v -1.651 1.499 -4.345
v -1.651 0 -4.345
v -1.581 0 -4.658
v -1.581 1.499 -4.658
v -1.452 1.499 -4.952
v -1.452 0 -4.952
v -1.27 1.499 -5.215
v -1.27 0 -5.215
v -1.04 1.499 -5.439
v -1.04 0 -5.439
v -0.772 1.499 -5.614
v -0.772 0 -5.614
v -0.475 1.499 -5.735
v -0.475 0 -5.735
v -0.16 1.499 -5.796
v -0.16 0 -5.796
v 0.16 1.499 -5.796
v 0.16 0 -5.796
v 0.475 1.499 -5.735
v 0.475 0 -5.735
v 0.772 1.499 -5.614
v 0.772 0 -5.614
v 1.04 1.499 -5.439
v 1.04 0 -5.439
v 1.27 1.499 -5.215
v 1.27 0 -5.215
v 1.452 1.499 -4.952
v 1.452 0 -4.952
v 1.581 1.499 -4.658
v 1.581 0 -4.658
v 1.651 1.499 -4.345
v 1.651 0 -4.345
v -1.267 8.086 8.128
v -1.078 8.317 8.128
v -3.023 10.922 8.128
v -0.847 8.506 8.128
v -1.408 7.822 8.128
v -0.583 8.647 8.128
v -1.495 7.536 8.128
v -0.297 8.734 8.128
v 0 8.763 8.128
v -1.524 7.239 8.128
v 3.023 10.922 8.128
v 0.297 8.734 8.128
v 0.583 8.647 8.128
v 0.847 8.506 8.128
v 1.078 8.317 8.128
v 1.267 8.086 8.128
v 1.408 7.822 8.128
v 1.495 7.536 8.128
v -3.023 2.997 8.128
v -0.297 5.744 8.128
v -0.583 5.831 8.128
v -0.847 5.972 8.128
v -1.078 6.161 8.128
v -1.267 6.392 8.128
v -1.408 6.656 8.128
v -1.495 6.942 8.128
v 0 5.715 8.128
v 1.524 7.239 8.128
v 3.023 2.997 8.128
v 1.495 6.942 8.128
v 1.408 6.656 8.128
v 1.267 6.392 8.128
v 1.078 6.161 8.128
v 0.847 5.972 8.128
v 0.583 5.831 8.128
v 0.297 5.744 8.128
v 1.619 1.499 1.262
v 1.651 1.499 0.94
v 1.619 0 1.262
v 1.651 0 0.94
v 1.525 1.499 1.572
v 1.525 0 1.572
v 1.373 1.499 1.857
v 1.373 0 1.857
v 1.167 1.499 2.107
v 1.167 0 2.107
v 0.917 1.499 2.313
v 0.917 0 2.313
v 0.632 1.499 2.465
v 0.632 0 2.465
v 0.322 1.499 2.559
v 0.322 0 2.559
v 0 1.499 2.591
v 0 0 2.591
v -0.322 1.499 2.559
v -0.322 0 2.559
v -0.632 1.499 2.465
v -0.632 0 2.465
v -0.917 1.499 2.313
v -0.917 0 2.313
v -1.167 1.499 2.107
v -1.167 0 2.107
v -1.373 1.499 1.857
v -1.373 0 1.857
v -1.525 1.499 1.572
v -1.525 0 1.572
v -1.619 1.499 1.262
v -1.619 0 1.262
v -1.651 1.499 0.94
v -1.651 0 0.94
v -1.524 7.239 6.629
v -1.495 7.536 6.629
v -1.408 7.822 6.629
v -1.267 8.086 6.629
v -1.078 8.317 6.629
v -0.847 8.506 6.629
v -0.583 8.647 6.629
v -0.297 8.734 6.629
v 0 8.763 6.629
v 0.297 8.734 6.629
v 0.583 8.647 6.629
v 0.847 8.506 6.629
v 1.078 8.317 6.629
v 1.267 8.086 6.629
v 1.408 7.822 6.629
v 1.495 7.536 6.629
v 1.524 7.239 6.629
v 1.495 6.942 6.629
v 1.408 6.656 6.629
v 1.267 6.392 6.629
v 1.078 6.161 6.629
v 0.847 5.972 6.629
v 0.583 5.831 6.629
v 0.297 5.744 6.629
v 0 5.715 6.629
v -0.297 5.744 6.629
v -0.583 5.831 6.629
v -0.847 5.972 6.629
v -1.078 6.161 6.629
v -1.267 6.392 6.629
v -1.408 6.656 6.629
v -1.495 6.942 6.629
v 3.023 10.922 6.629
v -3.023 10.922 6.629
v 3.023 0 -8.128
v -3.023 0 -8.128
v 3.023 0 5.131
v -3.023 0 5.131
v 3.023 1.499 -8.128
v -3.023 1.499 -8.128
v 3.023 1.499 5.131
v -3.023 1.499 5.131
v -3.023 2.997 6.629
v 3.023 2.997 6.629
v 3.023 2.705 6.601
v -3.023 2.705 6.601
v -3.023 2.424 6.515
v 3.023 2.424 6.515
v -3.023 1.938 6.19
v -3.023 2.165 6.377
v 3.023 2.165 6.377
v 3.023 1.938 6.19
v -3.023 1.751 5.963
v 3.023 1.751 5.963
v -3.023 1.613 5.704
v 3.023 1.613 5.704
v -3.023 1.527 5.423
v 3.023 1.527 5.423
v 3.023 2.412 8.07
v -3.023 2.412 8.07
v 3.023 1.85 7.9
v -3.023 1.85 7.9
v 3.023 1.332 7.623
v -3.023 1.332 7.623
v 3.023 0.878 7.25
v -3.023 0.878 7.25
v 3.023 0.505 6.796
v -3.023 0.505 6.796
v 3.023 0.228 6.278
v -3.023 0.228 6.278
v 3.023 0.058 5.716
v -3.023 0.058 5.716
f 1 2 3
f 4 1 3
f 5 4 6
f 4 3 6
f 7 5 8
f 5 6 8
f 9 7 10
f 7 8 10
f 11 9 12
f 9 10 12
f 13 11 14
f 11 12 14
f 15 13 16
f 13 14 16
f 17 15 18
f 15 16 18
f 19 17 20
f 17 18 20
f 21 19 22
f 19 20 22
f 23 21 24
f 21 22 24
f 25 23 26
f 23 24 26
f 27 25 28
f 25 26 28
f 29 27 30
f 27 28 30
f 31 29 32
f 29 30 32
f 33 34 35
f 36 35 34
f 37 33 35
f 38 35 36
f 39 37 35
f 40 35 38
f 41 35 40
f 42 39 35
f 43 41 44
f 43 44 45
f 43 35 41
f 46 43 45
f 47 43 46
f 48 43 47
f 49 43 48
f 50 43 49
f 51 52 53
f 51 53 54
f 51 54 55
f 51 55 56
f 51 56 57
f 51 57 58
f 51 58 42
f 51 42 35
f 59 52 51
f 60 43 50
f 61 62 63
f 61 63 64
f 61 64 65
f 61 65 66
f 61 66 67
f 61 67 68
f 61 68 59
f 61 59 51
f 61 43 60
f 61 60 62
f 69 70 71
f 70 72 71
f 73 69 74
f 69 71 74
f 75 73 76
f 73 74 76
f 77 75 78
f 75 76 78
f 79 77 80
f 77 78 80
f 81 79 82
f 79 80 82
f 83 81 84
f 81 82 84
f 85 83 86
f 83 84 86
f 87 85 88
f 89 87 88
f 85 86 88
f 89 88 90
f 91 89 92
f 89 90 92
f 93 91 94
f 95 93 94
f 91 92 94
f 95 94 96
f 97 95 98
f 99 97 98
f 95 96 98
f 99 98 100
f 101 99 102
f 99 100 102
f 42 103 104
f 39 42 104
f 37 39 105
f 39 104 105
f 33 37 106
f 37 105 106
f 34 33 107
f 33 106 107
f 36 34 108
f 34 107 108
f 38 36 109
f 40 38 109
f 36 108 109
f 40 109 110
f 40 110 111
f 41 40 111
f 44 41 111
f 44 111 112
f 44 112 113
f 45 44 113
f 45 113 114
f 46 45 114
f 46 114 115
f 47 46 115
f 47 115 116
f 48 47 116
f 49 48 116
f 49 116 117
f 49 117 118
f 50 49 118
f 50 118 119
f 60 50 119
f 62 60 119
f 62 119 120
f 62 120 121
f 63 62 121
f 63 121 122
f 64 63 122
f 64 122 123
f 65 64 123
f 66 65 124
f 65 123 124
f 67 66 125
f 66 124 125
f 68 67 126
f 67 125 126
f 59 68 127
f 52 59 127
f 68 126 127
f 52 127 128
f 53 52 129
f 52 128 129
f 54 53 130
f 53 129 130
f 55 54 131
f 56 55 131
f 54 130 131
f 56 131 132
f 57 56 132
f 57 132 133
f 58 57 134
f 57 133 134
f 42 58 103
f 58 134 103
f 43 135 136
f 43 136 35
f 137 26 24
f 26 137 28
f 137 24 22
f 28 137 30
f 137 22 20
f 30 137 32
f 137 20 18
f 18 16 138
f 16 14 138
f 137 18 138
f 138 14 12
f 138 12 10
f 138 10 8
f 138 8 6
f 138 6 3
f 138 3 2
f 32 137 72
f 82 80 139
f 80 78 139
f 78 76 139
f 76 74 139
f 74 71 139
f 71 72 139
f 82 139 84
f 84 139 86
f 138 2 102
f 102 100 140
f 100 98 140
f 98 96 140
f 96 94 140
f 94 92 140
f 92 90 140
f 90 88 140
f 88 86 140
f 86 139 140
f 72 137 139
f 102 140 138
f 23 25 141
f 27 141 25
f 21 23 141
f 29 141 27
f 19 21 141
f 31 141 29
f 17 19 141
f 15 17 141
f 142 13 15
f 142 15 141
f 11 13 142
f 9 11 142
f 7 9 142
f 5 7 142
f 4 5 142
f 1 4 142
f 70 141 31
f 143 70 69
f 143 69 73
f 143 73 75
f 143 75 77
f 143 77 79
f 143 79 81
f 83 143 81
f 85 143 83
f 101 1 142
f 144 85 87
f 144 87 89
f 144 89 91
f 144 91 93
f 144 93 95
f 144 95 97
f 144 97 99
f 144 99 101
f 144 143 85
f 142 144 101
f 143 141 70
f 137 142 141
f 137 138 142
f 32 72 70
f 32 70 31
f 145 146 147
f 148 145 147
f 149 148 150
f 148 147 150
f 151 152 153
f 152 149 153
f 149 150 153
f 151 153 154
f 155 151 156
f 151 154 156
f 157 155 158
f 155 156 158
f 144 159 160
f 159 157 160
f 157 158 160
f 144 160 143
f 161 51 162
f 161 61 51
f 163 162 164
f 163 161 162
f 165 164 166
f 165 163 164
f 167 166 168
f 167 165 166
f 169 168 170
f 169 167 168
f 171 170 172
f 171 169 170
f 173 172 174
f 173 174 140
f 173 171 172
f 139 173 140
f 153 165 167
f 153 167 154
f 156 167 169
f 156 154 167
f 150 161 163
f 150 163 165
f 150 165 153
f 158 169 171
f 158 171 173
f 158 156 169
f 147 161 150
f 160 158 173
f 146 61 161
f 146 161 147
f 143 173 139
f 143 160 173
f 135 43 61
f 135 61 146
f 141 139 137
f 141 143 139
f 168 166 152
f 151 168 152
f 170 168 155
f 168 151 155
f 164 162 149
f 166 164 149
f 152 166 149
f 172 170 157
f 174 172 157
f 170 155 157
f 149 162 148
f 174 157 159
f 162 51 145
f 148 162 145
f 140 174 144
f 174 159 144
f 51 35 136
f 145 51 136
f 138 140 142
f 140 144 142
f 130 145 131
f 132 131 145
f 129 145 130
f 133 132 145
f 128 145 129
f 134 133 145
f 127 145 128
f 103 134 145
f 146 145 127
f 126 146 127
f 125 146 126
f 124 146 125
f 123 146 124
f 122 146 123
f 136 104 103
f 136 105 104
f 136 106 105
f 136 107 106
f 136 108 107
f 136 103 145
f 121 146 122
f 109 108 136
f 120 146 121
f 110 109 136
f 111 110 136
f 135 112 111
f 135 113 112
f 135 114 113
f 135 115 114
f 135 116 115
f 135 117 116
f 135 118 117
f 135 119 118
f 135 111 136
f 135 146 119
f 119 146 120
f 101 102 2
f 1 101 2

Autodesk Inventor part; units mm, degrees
ref_plane "YZ Plane" through (0, 0, 0) normal (1, 0, 0) x (0, 1, 0)
ref_plane "XZ Plane" through (0, 0, 0) normal (0, 1, 0) x (-1, 0, 0)
ref_plane "XY Plane" through (0, 0, 0) normal (0, 0, 1) x (1, 0, 0)
sketch "Sketch1" plane through (0, 0, 0) normal (0, 1, 0) x (-1, 0, 0)
  line L0 (-3.0226, 8.128) -> (3.0226, 8.128)
  line L1 (3.0226, 8.128) -> (3.0226, -8.128)
  line L2 (3.0226, -8.128) -> (-3.0226, -8.128)
  line L3 (-3.0226, -8.128) -> (-3.0226, 8.128)
  line L4 (-3.0226, 8.128) -> (3.0226, -8.128) construction
  line L5 (3.0226, 8.128) -> (-3.0226, -8.128) construction
  line L6 (1.651, 0.9398) -> (1.651, -4.3454)
  line L7 (-1.651, 0.9398) -> (-1.651, -4.3454)
  arc A0 (-1.651, -4.3454) -> (1.651, -4.3454) centre (0, -4.1402) ccw
  arc A1 (1.651, 0.9398) -> (-1.651, 0.9398) centre (0, 0.9398) ccw
  line L8 (0, 9.1418) -> (0, -10.0518)
  point P0 (0, 0)
  point P1 (0, 8.128)
  dimension "d0" = 16.256
  dimension "d1" = 6.0452
  dimension "d27" = 3.302
  dimension "d28" = 1.6637
  dimension "d29" = 3.0226
  dimension "d30" = 5.08
extrude "Plate1" add sketch "Sketch1" along normal blind 1.4986 contours L0 L8 A1 L7 A0 L2 L3 | L0 L1 L2 L8 A0 L6 A1
sketch "Sketch2" plane through (3.0226, 0, 6.6294) normal (0, 0, 1) x (1, 0, 0)
  line L0 (-6.0452, 0) -> (0, 0)
  line L1 (0, 0) -> (0, 10.922)
  line L2 (0, 10.922) -> (-6.0452, 10.922)
  line L3 (-6.0452, 10.922) -> (-6.0452, 0)
edge flange "Flange1" height 10.922 angle 90 thickness 1.4986 bend radius 1.4986 thickness toward (0, 0, 1) relief straight relief width 1.4986 relief depth 0.7493 edges at (0, 1.4986, 8.128) wall of the first edge with corners at (-3.0226, 0, 6.6294) (3.0226, 0, 6.6294) (3.0226, 10.922, 6.6294) (-3.0226, 10.922, 6.6294)
bend "Bend1"
corner "Corner1"
sketch "Sketch4" plane through (3.0226, 10.922, 6.6294) normal (0, 0, -1) x (-1, 0, 0)
  circle A0 centre (3.0226, -3.683) radius 1.524
  line L0 (6.0452, 0) -> (0, 0) projected
  line L1 (0, -10.922) -> (6.0452, -10.922) projected
  point P0 (3.0226, -10.922)
  dimension "d22" = 3.048
  dimension "d25" = 7.239
extrude "Extrusion3" cut sketch "Sketch4" against normal blind 1.4986
equation "\"d11\" = BendReliefWidth"
equation "\"d12\" = BendReliefDepth"
equation "\"d13\" = MinimumRemnant"
equation "\"d14\" = BendRadius"
equation "\"d17\" = BendRadius"
equation "\"d18\" = CornerReliefSize"
equation "\"d19\" = GapSize"
equation "\"d20\" = JacobiRadiusSize"
equation "\"BendRadius\" = Thickness"
equation "\"BendReliefWidth\" = Thickness"
equation "\"BendReliefDepth\" = 0.5 * Thickness"
equation "\"CornerReliefSize\" = 4 * Thickness"
equation "\"MinimumRemnant\" = 2 * Thickness"
equation "\"TransitionRadius\" = BendRadius"
equation "\"JacobiRadiusSize\" = Thickness"
equation "\"GapSize\" = Thickness"
equation "\"d10\" = BendRadius"
equation "\"Thickness\" = 1.4986"
properties part number "dsub37Bracket"
